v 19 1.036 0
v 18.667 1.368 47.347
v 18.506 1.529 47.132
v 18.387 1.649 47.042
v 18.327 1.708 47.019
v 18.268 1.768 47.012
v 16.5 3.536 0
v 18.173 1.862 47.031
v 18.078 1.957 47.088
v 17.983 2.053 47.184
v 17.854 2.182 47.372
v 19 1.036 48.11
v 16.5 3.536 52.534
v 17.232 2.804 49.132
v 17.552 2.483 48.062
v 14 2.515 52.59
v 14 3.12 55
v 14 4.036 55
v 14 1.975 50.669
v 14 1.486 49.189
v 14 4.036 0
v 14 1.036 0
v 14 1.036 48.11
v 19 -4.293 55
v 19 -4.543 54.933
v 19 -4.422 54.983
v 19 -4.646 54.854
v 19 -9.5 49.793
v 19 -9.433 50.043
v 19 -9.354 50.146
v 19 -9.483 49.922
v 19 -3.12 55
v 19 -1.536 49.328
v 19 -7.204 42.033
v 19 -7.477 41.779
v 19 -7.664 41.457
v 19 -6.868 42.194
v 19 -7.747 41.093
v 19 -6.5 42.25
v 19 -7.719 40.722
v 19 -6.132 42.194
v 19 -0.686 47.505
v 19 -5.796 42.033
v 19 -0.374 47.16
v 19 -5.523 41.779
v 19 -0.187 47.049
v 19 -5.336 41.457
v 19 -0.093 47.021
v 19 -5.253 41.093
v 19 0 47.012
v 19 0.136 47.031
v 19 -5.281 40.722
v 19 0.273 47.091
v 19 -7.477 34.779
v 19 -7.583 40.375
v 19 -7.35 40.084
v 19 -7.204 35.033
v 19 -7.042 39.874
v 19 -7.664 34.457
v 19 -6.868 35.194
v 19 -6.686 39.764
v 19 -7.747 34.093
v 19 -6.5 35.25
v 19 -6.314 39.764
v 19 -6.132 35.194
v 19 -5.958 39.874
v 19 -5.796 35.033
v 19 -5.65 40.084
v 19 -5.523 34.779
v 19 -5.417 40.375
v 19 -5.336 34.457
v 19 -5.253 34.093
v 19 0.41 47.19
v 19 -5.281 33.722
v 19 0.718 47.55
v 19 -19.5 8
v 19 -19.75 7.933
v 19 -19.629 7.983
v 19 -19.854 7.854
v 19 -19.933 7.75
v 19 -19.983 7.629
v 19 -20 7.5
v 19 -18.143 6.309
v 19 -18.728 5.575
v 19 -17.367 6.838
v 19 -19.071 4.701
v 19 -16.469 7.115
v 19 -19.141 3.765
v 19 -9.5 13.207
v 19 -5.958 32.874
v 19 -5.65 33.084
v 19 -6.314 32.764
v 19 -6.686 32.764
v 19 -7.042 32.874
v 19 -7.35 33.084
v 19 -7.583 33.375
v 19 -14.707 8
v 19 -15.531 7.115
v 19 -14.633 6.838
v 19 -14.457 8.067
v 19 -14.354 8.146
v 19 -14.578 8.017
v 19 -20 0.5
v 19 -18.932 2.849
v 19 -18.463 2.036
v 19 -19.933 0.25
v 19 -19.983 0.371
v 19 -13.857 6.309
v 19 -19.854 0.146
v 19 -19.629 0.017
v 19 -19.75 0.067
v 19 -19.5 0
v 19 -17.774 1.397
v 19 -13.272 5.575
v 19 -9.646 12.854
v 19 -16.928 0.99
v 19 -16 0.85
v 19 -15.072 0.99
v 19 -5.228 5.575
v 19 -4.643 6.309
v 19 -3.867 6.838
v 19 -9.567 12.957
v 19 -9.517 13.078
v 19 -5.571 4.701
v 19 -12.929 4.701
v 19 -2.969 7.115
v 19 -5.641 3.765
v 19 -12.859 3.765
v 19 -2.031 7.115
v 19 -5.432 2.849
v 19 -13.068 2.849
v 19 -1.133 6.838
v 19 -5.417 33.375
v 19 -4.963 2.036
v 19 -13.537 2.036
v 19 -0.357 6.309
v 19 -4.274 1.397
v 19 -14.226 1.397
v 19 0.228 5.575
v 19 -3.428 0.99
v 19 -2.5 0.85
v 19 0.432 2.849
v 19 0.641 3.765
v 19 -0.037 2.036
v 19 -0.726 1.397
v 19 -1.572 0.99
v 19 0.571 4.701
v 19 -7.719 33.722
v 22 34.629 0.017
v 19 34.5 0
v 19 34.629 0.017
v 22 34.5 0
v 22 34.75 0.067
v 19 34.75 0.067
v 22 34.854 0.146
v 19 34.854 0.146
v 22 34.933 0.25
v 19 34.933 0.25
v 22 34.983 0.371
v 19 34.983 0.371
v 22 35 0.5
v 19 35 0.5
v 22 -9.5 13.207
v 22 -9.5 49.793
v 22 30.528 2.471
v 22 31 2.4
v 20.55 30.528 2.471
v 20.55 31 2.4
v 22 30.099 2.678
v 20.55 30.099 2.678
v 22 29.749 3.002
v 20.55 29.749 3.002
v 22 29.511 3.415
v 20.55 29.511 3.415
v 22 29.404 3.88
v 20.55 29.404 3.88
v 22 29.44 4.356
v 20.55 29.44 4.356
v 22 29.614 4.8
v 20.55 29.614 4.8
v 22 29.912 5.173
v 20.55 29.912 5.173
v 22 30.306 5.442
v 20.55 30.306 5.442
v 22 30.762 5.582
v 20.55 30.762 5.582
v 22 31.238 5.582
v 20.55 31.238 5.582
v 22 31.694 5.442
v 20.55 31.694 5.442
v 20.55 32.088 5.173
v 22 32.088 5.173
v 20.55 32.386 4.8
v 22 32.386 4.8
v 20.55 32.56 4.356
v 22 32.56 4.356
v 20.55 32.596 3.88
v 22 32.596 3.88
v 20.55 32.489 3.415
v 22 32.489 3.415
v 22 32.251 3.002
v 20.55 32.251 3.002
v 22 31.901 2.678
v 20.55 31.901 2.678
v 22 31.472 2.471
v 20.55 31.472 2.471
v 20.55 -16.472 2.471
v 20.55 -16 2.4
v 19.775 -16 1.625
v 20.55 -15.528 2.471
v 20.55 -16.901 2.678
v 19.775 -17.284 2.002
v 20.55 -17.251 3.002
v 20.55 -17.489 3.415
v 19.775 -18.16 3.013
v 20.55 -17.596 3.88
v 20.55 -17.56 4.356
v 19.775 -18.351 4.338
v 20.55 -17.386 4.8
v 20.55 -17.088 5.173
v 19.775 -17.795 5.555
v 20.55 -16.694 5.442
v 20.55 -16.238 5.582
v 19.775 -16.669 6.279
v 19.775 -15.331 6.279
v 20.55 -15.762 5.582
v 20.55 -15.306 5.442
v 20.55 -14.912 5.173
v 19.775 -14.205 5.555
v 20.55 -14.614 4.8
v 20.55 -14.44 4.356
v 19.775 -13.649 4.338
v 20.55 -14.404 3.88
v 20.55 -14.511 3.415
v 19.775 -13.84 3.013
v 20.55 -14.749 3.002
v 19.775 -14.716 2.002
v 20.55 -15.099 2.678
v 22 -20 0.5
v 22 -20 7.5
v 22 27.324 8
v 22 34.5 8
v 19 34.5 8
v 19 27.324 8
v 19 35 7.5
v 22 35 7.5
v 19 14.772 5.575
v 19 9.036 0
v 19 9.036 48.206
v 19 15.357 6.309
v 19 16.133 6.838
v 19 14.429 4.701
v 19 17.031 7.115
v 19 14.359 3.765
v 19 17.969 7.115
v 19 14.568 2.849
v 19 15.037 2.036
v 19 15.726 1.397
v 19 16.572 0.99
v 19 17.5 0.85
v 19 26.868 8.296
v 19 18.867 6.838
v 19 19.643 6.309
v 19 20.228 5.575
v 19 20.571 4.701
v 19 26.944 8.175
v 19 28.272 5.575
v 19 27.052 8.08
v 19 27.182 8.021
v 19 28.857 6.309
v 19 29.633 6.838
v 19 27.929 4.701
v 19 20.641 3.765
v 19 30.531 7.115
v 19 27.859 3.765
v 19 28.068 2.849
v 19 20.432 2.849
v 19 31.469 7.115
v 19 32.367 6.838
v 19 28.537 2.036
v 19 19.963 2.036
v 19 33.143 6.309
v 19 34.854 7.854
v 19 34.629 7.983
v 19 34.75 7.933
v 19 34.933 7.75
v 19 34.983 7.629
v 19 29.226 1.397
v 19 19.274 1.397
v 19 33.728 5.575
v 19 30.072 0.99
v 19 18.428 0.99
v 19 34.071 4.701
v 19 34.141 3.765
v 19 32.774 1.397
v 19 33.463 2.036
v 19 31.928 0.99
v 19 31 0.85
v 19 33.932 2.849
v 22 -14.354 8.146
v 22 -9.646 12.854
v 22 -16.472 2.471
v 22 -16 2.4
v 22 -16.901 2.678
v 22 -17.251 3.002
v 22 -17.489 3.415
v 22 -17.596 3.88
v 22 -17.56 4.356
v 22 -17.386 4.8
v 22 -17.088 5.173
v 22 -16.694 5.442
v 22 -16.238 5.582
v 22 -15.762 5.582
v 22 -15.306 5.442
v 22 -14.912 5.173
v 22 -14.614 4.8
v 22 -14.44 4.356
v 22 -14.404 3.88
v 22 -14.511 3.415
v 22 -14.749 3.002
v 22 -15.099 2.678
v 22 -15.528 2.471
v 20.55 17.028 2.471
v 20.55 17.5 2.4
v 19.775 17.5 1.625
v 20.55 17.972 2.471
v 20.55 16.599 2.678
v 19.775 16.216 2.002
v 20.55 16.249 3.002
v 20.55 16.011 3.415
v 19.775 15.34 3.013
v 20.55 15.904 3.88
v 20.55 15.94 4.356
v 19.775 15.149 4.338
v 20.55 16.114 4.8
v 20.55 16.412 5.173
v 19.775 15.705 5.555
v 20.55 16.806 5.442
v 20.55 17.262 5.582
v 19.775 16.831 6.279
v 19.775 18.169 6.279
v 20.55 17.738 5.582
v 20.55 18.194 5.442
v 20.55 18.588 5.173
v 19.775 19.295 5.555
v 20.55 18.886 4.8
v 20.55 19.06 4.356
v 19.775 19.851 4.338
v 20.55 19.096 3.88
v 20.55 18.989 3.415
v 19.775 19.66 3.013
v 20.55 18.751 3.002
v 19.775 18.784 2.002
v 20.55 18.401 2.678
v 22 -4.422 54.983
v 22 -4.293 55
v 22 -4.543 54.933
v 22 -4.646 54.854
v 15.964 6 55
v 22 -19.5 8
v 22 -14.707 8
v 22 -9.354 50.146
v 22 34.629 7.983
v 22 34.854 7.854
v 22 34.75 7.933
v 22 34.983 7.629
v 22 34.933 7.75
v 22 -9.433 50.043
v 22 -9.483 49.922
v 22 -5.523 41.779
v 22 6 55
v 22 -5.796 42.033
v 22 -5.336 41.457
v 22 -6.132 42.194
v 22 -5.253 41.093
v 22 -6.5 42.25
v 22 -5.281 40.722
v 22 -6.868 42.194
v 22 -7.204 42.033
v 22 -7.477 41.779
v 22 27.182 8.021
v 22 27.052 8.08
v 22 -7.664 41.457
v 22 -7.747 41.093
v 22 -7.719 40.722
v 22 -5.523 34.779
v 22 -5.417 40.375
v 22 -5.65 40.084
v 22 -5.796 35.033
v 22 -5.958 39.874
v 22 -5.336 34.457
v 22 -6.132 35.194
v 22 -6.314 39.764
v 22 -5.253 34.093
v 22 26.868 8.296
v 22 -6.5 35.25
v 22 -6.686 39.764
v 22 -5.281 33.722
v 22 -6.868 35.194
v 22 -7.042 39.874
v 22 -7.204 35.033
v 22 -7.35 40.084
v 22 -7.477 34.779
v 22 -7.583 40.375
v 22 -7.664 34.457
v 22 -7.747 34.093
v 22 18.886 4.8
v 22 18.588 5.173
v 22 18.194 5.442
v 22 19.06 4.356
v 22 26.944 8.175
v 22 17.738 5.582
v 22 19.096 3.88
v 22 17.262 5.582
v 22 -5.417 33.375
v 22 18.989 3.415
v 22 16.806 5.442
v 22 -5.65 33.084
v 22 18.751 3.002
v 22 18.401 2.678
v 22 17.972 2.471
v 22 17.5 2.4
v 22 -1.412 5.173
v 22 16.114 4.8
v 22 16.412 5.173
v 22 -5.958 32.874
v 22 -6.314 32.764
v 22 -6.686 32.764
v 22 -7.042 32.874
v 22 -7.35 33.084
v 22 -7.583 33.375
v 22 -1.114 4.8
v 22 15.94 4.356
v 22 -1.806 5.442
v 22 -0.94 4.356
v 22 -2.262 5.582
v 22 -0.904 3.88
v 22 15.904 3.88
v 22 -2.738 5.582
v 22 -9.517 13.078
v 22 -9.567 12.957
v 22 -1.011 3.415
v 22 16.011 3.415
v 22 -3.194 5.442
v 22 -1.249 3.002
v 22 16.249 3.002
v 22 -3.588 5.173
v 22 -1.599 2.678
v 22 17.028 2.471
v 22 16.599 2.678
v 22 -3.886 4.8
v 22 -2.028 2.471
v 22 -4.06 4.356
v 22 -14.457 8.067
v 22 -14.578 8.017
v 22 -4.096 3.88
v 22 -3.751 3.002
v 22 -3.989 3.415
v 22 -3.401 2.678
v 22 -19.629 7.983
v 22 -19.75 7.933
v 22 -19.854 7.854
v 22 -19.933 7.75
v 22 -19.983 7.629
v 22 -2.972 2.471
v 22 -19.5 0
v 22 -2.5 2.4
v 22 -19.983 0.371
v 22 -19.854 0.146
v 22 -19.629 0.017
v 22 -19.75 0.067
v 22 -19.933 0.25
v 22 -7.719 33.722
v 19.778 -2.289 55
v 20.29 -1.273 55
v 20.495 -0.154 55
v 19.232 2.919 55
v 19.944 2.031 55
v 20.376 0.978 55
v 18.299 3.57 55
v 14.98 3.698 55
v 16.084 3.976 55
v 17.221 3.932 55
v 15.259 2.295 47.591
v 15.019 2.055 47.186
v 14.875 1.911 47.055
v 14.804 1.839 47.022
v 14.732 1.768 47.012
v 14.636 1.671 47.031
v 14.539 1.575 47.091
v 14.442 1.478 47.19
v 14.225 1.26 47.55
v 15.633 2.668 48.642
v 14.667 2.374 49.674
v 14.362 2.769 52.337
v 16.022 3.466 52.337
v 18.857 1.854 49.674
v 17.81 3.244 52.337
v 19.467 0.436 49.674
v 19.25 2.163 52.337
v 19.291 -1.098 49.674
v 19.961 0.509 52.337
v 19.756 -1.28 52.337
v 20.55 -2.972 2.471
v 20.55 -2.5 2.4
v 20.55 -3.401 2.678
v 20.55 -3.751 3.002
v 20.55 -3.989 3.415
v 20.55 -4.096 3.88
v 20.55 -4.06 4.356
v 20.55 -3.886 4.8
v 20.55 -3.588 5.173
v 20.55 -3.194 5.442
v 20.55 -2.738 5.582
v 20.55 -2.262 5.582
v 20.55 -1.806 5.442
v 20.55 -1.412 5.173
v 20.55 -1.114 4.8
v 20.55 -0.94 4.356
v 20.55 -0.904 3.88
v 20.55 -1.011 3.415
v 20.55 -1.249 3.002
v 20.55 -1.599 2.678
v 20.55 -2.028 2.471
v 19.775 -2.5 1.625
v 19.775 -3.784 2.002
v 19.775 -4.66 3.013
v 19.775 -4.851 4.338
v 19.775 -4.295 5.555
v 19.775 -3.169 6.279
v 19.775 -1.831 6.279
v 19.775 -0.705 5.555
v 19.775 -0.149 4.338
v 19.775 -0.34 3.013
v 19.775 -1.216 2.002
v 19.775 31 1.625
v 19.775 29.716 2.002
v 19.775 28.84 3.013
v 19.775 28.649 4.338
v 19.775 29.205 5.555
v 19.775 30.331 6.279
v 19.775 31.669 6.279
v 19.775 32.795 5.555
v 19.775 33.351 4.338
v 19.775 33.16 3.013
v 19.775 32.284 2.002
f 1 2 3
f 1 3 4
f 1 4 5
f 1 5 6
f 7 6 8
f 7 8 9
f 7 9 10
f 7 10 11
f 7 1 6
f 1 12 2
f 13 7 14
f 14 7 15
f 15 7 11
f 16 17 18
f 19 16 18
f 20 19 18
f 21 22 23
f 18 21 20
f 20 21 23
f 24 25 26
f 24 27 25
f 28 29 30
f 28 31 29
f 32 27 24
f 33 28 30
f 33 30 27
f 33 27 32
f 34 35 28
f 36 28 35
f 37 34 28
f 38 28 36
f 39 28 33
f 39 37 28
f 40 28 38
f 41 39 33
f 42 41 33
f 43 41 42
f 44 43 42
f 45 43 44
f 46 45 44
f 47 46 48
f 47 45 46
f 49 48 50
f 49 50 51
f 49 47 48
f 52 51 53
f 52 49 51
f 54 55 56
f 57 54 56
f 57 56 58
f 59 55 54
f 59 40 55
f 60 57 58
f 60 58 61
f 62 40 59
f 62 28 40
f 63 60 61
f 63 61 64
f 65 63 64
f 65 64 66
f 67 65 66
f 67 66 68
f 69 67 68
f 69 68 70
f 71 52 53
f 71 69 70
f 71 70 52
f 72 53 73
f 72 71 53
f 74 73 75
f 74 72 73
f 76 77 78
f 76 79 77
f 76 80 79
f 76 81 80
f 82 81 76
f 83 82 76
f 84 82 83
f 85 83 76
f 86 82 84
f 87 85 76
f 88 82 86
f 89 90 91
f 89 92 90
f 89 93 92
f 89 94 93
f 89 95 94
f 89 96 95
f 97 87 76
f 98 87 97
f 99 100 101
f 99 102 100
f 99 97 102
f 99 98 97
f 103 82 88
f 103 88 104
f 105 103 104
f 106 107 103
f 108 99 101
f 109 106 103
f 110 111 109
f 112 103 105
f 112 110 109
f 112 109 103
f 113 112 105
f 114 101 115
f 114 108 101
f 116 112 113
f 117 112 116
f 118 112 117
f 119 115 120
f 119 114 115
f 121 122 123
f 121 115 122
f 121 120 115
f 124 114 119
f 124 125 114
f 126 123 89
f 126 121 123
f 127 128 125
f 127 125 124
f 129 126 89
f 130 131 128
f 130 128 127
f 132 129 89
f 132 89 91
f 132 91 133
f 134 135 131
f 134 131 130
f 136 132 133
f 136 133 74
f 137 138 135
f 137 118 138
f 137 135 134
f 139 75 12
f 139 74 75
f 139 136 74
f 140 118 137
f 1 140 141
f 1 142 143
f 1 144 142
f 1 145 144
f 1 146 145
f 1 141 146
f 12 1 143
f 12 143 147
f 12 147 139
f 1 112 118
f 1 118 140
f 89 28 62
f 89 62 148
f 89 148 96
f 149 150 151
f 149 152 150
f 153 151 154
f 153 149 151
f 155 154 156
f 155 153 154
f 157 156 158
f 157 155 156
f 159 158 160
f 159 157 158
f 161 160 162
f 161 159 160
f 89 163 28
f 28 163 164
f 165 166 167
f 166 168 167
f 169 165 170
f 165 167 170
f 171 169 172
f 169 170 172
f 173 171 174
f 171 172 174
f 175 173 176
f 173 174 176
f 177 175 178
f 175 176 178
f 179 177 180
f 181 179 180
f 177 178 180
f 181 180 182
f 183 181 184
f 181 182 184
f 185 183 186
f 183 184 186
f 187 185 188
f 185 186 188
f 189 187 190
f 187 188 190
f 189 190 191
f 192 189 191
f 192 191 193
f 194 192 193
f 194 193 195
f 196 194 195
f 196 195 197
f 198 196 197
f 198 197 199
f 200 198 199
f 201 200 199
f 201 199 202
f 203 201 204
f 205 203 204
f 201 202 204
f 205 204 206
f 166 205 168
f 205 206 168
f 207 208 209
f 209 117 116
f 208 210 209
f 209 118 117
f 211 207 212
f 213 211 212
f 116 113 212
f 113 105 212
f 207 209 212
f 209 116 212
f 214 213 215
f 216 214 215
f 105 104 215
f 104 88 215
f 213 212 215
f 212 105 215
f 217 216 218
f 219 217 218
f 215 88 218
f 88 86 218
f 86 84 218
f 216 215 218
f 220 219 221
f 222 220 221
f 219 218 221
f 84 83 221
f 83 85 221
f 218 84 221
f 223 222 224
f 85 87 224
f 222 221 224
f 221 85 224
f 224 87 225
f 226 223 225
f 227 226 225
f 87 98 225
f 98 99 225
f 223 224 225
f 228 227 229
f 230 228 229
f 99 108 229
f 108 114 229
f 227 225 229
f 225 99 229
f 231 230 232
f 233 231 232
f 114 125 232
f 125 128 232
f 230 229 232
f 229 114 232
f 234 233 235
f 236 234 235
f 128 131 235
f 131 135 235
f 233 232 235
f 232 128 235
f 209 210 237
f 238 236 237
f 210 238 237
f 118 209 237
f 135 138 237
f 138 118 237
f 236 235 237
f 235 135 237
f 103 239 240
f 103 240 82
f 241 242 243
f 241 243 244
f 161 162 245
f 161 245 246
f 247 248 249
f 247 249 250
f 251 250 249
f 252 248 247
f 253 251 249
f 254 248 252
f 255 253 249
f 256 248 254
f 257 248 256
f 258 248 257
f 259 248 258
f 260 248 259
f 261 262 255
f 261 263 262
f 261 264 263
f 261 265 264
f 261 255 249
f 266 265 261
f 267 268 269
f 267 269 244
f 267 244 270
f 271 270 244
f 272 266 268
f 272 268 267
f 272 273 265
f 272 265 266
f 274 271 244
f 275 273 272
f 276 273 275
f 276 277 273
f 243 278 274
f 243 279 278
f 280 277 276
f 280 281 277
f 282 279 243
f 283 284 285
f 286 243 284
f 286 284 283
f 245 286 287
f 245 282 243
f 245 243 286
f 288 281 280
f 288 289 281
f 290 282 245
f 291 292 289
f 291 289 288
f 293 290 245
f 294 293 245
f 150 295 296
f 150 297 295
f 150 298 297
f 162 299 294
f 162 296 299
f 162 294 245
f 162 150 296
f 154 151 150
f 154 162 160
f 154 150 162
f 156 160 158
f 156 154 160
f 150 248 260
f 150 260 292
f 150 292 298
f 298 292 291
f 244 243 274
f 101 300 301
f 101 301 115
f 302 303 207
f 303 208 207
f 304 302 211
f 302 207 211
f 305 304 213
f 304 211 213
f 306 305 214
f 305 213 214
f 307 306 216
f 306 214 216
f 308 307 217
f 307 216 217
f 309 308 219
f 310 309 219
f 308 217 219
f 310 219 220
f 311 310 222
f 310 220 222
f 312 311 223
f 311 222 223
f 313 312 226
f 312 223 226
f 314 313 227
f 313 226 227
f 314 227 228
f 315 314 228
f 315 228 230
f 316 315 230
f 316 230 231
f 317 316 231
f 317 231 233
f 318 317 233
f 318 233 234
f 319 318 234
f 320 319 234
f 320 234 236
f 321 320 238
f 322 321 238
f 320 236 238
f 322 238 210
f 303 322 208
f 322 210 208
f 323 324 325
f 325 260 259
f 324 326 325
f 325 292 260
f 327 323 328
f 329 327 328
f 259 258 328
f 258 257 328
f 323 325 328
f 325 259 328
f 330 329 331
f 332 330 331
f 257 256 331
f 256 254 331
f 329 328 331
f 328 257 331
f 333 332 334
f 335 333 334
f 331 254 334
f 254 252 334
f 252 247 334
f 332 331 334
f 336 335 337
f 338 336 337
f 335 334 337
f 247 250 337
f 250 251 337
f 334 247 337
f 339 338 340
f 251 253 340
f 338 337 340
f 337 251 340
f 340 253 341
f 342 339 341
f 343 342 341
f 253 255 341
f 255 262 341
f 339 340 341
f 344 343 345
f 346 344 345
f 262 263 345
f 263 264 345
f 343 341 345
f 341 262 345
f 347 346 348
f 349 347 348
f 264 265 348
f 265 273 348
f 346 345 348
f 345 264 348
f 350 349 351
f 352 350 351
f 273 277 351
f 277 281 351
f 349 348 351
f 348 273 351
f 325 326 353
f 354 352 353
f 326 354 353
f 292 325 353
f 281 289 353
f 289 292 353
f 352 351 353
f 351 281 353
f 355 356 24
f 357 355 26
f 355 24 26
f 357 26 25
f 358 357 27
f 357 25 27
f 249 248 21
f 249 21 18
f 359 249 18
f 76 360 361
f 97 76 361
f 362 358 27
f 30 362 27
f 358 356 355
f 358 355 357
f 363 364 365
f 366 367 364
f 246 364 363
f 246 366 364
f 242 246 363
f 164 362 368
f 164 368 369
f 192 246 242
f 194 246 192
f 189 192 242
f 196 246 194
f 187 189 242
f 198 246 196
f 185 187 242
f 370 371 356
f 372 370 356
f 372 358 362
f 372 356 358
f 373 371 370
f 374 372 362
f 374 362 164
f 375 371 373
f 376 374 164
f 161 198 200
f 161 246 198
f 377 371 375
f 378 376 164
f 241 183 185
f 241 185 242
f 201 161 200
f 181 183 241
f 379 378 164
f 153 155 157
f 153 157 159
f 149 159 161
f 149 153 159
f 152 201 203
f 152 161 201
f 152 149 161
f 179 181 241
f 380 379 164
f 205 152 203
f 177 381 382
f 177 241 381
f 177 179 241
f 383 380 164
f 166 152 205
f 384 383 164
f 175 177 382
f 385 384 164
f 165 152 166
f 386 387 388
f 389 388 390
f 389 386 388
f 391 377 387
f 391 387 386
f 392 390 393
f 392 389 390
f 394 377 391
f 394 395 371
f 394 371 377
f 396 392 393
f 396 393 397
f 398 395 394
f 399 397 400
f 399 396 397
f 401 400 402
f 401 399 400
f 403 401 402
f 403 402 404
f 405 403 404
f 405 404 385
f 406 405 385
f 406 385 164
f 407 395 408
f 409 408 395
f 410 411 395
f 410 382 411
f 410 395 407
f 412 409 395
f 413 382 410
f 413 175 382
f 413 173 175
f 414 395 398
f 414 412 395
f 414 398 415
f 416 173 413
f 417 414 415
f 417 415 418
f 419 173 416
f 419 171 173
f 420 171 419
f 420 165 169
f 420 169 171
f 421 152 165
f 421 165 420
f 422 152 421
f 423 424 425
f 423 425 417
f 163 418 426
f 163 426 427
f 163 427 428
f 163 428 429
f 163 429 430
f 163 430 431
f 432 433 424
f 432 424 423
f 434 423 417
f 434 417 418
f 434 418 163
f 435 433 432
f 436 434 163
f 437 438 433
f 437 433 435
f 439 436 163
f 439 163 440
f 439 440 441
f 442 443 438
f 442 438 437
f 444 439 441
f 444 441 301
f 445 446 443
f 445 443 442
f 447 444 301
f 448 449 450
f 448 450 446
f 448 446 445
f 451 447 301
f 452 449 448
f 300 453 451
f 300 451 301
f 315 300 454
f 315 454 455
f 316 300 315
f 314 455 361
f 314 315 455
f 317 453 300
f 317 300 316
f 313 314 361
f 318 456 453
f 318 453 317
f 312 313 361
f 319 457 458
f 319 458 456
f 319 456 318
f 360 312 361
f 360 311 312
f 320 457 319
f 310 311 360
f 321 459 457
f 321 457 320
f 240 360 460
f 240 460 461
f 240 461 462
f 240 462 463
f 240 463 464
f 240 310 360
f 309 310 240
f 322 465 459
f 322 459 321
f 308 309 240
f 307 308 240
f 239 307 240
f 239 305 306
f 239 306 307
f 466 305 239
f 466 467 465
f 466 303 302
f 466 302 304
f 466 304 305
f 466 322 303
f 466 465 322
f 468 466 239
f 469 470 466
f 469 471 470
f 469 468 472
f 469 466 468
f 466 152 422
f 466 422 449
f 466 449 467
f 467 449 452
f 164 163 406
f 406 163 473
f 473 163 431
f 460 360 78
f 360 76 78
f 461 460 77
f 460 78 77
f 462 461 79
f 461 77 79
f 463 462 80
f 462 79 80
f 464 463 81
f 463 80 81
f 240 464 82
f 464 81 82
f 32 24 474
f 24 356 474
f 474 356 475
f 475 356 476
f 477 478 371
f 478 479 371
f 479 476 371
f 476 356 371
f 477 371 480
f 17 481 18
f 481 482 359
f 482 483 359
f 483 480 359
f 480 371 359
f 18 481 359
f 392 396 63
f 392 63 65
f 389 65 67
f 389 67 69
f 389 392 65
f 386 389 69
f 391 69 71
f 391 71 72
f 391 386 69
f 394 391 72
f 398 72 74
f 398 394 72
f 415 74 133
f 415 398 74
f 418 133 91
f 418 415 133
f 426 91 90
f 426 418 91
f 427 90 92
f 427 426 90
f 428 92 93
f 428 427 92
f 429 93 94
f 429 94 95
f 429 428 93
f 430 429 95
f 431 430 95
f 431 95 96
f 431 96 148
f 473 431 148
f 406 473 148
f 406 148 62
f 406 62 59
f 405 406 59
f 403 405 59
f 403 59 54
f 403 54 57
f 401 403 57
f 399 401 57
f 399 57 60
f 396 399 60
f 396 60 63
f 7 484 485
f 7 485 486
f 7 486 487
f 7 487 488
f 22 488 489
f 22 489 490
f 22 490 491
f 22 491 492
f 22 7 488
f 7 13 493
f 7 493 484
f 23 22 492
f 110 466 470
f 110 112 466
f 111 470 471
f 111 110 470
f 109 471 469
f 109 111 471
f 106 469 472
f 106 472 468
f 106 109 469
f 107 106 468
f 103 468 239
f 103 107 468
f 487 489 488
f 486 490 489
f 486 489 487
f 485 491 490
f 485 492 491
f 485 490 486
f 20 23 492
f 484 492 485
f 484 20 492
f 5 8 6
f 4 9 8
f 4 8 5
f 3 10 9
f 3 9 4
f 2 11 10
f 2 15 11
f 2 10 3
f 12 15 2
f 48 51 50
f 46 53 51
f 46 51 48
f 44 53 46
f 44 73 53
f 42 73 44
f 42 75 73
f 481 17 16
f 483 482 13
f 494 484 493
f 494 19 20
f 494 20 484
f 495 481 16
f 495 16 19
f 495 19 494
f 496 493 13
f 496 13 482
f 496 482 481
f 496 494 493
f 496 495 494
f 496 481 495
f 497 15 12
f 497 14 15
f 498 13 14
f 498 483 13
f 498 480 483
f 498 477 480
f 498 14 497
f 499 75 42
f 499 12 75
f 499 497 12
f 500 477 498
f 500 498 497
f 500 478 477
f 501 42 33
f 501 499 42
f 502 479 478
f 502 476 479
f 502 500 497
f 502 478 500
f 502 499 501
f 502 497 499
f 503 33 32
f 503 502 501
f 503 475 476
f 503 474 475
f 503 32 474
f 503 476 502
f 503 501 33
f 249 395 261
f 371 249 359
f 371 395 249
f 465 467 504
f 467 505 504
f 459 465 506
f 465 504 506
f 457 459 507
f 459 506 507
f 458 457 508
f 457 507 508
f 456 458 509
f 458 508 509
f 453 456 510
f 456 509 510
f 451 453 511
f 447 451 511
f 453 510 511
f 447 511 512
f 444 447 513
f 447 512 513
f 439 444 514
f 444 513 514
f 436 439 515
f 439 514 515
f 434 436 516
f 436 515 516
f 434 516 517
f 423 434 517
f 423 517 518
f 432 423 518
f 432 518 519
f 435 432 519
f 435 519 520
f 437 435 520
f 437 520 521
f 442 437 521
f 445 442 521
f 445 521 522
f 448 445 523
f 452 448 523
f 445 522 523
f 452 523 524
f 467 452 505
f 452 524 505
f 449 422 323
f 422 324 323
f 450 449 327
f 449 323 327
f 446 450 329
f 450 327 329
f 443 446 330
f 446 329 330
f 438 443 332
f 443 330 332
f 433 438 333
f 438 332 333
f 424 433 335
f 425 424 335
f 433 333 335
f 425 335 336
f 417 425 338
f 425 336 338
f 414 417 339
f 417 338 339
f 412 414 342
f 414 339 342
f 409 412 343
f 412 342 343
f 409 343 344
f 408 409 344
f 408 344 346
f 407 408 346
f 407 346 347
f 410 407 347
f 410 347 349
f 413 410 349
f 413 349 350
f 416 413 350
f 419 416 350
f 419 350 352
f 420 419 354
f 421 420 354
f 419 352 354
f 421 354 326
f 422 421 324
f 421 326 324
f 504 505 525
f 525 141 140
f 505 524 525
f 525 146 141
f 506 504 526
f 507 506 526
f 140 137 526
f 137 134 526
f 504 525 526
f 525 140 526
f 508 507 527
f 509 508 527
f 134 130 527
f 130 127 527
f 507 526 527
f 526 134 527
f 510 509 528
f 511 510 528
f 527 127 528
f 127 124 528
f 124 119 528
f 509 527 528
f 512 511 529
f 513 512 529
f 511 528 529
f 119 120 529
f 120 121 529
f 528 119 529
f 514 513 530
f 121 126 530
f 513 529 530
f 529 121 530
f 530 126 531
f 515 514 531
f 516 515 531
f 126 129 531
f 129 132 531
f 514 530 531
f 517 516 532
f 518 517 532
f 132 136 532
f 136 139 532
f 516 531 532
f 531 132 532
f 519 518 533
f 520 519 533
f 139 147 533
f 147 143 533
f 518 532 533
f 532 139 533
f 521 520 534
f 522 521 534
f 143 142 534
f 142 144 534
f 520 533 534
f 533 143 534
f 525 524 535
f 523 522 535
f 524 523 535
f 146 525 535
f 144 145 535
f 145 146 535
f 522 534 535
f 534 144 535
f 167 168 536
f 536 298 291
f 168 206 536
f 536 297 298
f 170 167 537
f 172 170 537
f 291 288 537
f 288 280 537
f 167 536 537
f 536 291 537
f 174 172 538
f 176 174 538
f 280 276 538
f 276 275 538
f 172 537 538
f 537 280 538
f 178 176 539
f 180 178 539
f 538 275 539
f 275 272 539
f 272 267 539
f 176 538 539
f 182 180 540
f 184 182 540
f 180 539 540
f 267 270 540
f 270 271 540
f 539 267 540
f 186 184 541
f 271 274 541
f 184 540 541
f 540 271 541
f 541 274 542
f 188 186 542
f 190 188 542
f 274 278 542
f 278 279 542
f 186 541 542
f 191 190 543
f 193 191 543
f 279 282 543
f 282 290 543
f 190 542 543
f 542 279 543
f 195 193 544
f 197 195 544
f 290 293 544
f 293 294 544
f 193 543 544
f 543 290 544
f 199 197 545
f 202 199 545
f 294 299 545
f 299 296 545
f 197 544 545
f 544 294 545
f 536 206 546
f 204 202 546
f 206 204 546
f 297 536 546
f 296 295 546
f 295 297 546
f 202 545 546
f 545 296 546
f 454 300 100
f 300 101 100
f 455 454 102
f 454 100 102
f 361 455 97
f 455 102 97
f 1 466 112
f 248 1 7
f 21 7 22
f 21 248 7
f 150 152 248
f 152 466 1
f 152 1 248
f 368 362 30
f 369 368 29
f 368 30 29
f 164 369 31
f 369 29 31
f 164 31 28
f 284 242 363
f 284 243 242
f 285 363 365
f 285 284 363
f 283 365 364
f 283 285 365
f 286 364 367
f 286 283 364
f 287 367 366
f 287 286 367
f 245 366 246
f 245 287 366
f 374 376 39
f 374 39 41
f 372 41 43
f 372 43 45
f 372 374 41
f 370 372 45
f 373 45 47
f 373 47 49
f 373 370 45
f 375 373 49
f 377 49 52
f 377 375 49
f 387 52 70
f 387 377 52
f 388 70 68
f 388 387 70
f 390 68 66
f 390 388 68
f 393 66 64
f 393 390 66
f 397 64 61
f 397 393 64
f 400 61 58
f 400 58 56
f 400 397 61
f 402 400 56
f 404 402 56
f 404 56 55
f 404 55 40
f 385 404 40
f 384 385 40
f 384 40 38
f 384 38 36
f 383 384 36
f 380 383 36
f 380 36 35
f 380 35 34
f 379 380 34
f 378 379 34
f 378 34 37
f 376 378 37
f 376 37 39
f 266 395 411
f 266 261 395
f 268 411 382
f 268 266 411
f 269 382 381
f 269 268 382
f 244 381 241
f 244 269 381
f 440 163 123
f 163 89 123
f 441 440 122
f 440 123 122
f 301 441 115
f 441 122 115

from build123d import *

# Parameters (mm, degrees)
BOSS_EXTRUDE1_DEPTH                            = 55
SKETCH6_W                                      = 47
SKETCH6_H                                      = 10.5
CUT_EXTRUDE3_DEPTH                             = 55
CHAMFER3_SIZE                                  = 5
CHAMFER4_SIZE                                  = 5
CSK_FOR_M3_FLAT_HEAD_MACHINE_SCREW1_AT_2_COUNT = 2
CSK_FOR_M3_FLAT_HEAD_MACHINE_SCREW1_AT_2_PITCH = 13.5
CSK_FOR_M3_FLAT_HEAD_MACHINE_SCREW1_AT_3_COUNT = 2
CSK_FOR_M3_FLAT_HEAD_MACHINE_SCREW1_AT_3_PITCH = 47
CSK_FOR_M3_FLAT_HEAD_MACHINE_SCREW1_AT_4_COUNT = 2
CSK_FOR_M3_FLAT_HEAD_MACHINE_SCREW1_AT_4_PITCH = 33.5
TAP_DRILL_FOR_M3X0_5_TAP1_D                    = 2.5
FILLET1_R                                      = 0.5


# Read off the part's stored shape, not the designer's step: Body-Delete/Keep 1
with BuildPart() as part:
    # Sketch1 → Boss-Extrude1 (new body)
    with BuildSketch(Plane.XY):
        Polygon((22, -20), (25, -20), (25, 1.035533906), (27.5, 3.535533906), (30, 1.035533906), (30, 9.035533906), (25, 9.035533906), (25, 35), (22, 35), align=None)
    extrude(amount=BOSS_EXTRUDE1_DEPTH)

    # Sketch4 → Cut-Revolve1 (revolve, cut)
    with BuildSketch(Plane(origin=(0, 0, 0), x_dir=(1, 0, 0), z_dir=(0, 1, 0))):
        Polygon((27.5, -47.011533546), (30, -47.011533546), (31.5, -55.011533546), (27.5, -55.011533546), align=None)
    revolve(axis=Axis((27.5, 0, 0), (0, 0, 1)), mode=Mode.SUBTRACT)

    # Sketch6 → Cut-Extrude3 (cut)
    with BuildSketch(Plane.ZY.offset(-22)):
        Polygon((55, 6), (55, 35), (8, 35), (8, 27), align=None)
        with Locations((31.5, -14.75)):
            Rectangle(SKETCH6_W, SKETCH6_H)
    extrude(amount=-CUT_EXTRUDE3_DEPTH, mode=Mode.SUBTRACT)

    # Chamfer3
    chamfer3_edges = [part.edges().sort_by_distance(p)[0] for p in [
        (23.5, -9.5, 55),
        (23.5, -9.5, 8),
    ]]
    chamfer(chamfer3_edges, length=CHAMFER3_SIZE)

    # Chamfer4
    chamfer4_edges = [part.edges().sort_by_distance(p)[0] for p in [
        (30, 9.035533906, 24.10309301),
    ]]
    chamfer(chamfer4_edges, length=CHAMFER4_SIZE - 0.0001)  # a hair under: the kernel refuses the full size

    # Sketch8 → CSK for M3 Flat Head Machine Screw1 (revolve, cut)
    with BuildSketch(Plane(origin=(25, 31, 4), x_dir=(0, 0, -1), z_dir=(0, 1, 0))):
        Polygon((0, 0), (0, 3), (1.6, 3), (1.6, 1.55), (3.15, 0), align=None)
    csk_for_m3_flat_head_machine_screw1 = revolve(axis=Axis((31.35, 31, 4), (-1, 0, 0)), mode=Mode.SUBTRACT)

    # CSK for M3 Flat Head Machine Screw1 at 2: CSK for M3 Flat Head Machine Screw1 ×2
    with Locations(*[(0, -i * CSK_FOR_M3_FLAT_HEAD_MACHINE_SCREW1_AT_2_PITCH, 0) for i in range(1, CSK_FOR_M3_FLAT_HEAD_MACHINE_SCREW1_AT_2_COUNT)]):
        add(csk_for_m3_flat_head_machine_screw1, mode=Mode.SUBTRACT)

    # CSK for M3 Flat Head Machine Screw1 at 3: CSK for M3 Flat Head Machine Screw1 ×2
    with Locations(*[(0, -i * CSK_FOR_M3_FLAT_HEAD_MACHINE_SCREW1_AT_3_PITCH, 0) for i in range(1, CSK_FOR_M3_FLAT_HEAD_MACHINE_SCREW1_AT_3_COUNT)]):
        add(csk_for_m3_flat_head_machine_screw1, mode=Mode.SUBTRACT)

    # CSK for M3 Flat Head Machine Screw1 at 4: CSK for M3 Flat Head Machine Screw1 ×2
    with Locations(*[(0, -i * CSK_FOR_M3_FLAT_HEAD_MACHINE_SCREW1_AT_4_PITCH, 0) for i in range(1, CSK_FOR_M3_FLAT_HEAD_MACHINE_SCREW1_AT_4_COUNT)]):
        add(csk_for_m3_flat_head_machine_screw1, mode=Mode.SUBTRACT)

    # Tap Drill for M3x0.5 Tap1 (through all)
    with Locations(Plane(origin=(25, 0, 0), x_dir=(0, 0, -1), z_dir=(1, 0, 0))):
        with Locations((-41, -6.5), (-34, -6.5)):
            Hole(TAP_DRILL_FOR_M3X0_5_TAP1_D / 2)

    # Fillet1
    fillet1_edges = [part.edges().sort_by_distance(p)[0] for p in [
        (23.5, -20, 0),
        (23.5, 27, 8),
        (23.5, 35, 8),
        (23.5, -20, 8),
        (23.5, -14.5, 8),
        (23.5, -9.5, 50),
        (23.5, -9.5, 13),
        (23.5, -4.5, 55),
        (23.5, 35, 0),
    ]]
    fillet(fillet1_edges, radius=FILLET1_R)


with BuildPart() as body_2:
    # Mirror2: mirrored copy
    add(part.part.mirror(Plane(origin=(22, -20, 55), x_dir=(0, 0, 1), z_dir=(1, 0, 0))))


solid = body_2.part
